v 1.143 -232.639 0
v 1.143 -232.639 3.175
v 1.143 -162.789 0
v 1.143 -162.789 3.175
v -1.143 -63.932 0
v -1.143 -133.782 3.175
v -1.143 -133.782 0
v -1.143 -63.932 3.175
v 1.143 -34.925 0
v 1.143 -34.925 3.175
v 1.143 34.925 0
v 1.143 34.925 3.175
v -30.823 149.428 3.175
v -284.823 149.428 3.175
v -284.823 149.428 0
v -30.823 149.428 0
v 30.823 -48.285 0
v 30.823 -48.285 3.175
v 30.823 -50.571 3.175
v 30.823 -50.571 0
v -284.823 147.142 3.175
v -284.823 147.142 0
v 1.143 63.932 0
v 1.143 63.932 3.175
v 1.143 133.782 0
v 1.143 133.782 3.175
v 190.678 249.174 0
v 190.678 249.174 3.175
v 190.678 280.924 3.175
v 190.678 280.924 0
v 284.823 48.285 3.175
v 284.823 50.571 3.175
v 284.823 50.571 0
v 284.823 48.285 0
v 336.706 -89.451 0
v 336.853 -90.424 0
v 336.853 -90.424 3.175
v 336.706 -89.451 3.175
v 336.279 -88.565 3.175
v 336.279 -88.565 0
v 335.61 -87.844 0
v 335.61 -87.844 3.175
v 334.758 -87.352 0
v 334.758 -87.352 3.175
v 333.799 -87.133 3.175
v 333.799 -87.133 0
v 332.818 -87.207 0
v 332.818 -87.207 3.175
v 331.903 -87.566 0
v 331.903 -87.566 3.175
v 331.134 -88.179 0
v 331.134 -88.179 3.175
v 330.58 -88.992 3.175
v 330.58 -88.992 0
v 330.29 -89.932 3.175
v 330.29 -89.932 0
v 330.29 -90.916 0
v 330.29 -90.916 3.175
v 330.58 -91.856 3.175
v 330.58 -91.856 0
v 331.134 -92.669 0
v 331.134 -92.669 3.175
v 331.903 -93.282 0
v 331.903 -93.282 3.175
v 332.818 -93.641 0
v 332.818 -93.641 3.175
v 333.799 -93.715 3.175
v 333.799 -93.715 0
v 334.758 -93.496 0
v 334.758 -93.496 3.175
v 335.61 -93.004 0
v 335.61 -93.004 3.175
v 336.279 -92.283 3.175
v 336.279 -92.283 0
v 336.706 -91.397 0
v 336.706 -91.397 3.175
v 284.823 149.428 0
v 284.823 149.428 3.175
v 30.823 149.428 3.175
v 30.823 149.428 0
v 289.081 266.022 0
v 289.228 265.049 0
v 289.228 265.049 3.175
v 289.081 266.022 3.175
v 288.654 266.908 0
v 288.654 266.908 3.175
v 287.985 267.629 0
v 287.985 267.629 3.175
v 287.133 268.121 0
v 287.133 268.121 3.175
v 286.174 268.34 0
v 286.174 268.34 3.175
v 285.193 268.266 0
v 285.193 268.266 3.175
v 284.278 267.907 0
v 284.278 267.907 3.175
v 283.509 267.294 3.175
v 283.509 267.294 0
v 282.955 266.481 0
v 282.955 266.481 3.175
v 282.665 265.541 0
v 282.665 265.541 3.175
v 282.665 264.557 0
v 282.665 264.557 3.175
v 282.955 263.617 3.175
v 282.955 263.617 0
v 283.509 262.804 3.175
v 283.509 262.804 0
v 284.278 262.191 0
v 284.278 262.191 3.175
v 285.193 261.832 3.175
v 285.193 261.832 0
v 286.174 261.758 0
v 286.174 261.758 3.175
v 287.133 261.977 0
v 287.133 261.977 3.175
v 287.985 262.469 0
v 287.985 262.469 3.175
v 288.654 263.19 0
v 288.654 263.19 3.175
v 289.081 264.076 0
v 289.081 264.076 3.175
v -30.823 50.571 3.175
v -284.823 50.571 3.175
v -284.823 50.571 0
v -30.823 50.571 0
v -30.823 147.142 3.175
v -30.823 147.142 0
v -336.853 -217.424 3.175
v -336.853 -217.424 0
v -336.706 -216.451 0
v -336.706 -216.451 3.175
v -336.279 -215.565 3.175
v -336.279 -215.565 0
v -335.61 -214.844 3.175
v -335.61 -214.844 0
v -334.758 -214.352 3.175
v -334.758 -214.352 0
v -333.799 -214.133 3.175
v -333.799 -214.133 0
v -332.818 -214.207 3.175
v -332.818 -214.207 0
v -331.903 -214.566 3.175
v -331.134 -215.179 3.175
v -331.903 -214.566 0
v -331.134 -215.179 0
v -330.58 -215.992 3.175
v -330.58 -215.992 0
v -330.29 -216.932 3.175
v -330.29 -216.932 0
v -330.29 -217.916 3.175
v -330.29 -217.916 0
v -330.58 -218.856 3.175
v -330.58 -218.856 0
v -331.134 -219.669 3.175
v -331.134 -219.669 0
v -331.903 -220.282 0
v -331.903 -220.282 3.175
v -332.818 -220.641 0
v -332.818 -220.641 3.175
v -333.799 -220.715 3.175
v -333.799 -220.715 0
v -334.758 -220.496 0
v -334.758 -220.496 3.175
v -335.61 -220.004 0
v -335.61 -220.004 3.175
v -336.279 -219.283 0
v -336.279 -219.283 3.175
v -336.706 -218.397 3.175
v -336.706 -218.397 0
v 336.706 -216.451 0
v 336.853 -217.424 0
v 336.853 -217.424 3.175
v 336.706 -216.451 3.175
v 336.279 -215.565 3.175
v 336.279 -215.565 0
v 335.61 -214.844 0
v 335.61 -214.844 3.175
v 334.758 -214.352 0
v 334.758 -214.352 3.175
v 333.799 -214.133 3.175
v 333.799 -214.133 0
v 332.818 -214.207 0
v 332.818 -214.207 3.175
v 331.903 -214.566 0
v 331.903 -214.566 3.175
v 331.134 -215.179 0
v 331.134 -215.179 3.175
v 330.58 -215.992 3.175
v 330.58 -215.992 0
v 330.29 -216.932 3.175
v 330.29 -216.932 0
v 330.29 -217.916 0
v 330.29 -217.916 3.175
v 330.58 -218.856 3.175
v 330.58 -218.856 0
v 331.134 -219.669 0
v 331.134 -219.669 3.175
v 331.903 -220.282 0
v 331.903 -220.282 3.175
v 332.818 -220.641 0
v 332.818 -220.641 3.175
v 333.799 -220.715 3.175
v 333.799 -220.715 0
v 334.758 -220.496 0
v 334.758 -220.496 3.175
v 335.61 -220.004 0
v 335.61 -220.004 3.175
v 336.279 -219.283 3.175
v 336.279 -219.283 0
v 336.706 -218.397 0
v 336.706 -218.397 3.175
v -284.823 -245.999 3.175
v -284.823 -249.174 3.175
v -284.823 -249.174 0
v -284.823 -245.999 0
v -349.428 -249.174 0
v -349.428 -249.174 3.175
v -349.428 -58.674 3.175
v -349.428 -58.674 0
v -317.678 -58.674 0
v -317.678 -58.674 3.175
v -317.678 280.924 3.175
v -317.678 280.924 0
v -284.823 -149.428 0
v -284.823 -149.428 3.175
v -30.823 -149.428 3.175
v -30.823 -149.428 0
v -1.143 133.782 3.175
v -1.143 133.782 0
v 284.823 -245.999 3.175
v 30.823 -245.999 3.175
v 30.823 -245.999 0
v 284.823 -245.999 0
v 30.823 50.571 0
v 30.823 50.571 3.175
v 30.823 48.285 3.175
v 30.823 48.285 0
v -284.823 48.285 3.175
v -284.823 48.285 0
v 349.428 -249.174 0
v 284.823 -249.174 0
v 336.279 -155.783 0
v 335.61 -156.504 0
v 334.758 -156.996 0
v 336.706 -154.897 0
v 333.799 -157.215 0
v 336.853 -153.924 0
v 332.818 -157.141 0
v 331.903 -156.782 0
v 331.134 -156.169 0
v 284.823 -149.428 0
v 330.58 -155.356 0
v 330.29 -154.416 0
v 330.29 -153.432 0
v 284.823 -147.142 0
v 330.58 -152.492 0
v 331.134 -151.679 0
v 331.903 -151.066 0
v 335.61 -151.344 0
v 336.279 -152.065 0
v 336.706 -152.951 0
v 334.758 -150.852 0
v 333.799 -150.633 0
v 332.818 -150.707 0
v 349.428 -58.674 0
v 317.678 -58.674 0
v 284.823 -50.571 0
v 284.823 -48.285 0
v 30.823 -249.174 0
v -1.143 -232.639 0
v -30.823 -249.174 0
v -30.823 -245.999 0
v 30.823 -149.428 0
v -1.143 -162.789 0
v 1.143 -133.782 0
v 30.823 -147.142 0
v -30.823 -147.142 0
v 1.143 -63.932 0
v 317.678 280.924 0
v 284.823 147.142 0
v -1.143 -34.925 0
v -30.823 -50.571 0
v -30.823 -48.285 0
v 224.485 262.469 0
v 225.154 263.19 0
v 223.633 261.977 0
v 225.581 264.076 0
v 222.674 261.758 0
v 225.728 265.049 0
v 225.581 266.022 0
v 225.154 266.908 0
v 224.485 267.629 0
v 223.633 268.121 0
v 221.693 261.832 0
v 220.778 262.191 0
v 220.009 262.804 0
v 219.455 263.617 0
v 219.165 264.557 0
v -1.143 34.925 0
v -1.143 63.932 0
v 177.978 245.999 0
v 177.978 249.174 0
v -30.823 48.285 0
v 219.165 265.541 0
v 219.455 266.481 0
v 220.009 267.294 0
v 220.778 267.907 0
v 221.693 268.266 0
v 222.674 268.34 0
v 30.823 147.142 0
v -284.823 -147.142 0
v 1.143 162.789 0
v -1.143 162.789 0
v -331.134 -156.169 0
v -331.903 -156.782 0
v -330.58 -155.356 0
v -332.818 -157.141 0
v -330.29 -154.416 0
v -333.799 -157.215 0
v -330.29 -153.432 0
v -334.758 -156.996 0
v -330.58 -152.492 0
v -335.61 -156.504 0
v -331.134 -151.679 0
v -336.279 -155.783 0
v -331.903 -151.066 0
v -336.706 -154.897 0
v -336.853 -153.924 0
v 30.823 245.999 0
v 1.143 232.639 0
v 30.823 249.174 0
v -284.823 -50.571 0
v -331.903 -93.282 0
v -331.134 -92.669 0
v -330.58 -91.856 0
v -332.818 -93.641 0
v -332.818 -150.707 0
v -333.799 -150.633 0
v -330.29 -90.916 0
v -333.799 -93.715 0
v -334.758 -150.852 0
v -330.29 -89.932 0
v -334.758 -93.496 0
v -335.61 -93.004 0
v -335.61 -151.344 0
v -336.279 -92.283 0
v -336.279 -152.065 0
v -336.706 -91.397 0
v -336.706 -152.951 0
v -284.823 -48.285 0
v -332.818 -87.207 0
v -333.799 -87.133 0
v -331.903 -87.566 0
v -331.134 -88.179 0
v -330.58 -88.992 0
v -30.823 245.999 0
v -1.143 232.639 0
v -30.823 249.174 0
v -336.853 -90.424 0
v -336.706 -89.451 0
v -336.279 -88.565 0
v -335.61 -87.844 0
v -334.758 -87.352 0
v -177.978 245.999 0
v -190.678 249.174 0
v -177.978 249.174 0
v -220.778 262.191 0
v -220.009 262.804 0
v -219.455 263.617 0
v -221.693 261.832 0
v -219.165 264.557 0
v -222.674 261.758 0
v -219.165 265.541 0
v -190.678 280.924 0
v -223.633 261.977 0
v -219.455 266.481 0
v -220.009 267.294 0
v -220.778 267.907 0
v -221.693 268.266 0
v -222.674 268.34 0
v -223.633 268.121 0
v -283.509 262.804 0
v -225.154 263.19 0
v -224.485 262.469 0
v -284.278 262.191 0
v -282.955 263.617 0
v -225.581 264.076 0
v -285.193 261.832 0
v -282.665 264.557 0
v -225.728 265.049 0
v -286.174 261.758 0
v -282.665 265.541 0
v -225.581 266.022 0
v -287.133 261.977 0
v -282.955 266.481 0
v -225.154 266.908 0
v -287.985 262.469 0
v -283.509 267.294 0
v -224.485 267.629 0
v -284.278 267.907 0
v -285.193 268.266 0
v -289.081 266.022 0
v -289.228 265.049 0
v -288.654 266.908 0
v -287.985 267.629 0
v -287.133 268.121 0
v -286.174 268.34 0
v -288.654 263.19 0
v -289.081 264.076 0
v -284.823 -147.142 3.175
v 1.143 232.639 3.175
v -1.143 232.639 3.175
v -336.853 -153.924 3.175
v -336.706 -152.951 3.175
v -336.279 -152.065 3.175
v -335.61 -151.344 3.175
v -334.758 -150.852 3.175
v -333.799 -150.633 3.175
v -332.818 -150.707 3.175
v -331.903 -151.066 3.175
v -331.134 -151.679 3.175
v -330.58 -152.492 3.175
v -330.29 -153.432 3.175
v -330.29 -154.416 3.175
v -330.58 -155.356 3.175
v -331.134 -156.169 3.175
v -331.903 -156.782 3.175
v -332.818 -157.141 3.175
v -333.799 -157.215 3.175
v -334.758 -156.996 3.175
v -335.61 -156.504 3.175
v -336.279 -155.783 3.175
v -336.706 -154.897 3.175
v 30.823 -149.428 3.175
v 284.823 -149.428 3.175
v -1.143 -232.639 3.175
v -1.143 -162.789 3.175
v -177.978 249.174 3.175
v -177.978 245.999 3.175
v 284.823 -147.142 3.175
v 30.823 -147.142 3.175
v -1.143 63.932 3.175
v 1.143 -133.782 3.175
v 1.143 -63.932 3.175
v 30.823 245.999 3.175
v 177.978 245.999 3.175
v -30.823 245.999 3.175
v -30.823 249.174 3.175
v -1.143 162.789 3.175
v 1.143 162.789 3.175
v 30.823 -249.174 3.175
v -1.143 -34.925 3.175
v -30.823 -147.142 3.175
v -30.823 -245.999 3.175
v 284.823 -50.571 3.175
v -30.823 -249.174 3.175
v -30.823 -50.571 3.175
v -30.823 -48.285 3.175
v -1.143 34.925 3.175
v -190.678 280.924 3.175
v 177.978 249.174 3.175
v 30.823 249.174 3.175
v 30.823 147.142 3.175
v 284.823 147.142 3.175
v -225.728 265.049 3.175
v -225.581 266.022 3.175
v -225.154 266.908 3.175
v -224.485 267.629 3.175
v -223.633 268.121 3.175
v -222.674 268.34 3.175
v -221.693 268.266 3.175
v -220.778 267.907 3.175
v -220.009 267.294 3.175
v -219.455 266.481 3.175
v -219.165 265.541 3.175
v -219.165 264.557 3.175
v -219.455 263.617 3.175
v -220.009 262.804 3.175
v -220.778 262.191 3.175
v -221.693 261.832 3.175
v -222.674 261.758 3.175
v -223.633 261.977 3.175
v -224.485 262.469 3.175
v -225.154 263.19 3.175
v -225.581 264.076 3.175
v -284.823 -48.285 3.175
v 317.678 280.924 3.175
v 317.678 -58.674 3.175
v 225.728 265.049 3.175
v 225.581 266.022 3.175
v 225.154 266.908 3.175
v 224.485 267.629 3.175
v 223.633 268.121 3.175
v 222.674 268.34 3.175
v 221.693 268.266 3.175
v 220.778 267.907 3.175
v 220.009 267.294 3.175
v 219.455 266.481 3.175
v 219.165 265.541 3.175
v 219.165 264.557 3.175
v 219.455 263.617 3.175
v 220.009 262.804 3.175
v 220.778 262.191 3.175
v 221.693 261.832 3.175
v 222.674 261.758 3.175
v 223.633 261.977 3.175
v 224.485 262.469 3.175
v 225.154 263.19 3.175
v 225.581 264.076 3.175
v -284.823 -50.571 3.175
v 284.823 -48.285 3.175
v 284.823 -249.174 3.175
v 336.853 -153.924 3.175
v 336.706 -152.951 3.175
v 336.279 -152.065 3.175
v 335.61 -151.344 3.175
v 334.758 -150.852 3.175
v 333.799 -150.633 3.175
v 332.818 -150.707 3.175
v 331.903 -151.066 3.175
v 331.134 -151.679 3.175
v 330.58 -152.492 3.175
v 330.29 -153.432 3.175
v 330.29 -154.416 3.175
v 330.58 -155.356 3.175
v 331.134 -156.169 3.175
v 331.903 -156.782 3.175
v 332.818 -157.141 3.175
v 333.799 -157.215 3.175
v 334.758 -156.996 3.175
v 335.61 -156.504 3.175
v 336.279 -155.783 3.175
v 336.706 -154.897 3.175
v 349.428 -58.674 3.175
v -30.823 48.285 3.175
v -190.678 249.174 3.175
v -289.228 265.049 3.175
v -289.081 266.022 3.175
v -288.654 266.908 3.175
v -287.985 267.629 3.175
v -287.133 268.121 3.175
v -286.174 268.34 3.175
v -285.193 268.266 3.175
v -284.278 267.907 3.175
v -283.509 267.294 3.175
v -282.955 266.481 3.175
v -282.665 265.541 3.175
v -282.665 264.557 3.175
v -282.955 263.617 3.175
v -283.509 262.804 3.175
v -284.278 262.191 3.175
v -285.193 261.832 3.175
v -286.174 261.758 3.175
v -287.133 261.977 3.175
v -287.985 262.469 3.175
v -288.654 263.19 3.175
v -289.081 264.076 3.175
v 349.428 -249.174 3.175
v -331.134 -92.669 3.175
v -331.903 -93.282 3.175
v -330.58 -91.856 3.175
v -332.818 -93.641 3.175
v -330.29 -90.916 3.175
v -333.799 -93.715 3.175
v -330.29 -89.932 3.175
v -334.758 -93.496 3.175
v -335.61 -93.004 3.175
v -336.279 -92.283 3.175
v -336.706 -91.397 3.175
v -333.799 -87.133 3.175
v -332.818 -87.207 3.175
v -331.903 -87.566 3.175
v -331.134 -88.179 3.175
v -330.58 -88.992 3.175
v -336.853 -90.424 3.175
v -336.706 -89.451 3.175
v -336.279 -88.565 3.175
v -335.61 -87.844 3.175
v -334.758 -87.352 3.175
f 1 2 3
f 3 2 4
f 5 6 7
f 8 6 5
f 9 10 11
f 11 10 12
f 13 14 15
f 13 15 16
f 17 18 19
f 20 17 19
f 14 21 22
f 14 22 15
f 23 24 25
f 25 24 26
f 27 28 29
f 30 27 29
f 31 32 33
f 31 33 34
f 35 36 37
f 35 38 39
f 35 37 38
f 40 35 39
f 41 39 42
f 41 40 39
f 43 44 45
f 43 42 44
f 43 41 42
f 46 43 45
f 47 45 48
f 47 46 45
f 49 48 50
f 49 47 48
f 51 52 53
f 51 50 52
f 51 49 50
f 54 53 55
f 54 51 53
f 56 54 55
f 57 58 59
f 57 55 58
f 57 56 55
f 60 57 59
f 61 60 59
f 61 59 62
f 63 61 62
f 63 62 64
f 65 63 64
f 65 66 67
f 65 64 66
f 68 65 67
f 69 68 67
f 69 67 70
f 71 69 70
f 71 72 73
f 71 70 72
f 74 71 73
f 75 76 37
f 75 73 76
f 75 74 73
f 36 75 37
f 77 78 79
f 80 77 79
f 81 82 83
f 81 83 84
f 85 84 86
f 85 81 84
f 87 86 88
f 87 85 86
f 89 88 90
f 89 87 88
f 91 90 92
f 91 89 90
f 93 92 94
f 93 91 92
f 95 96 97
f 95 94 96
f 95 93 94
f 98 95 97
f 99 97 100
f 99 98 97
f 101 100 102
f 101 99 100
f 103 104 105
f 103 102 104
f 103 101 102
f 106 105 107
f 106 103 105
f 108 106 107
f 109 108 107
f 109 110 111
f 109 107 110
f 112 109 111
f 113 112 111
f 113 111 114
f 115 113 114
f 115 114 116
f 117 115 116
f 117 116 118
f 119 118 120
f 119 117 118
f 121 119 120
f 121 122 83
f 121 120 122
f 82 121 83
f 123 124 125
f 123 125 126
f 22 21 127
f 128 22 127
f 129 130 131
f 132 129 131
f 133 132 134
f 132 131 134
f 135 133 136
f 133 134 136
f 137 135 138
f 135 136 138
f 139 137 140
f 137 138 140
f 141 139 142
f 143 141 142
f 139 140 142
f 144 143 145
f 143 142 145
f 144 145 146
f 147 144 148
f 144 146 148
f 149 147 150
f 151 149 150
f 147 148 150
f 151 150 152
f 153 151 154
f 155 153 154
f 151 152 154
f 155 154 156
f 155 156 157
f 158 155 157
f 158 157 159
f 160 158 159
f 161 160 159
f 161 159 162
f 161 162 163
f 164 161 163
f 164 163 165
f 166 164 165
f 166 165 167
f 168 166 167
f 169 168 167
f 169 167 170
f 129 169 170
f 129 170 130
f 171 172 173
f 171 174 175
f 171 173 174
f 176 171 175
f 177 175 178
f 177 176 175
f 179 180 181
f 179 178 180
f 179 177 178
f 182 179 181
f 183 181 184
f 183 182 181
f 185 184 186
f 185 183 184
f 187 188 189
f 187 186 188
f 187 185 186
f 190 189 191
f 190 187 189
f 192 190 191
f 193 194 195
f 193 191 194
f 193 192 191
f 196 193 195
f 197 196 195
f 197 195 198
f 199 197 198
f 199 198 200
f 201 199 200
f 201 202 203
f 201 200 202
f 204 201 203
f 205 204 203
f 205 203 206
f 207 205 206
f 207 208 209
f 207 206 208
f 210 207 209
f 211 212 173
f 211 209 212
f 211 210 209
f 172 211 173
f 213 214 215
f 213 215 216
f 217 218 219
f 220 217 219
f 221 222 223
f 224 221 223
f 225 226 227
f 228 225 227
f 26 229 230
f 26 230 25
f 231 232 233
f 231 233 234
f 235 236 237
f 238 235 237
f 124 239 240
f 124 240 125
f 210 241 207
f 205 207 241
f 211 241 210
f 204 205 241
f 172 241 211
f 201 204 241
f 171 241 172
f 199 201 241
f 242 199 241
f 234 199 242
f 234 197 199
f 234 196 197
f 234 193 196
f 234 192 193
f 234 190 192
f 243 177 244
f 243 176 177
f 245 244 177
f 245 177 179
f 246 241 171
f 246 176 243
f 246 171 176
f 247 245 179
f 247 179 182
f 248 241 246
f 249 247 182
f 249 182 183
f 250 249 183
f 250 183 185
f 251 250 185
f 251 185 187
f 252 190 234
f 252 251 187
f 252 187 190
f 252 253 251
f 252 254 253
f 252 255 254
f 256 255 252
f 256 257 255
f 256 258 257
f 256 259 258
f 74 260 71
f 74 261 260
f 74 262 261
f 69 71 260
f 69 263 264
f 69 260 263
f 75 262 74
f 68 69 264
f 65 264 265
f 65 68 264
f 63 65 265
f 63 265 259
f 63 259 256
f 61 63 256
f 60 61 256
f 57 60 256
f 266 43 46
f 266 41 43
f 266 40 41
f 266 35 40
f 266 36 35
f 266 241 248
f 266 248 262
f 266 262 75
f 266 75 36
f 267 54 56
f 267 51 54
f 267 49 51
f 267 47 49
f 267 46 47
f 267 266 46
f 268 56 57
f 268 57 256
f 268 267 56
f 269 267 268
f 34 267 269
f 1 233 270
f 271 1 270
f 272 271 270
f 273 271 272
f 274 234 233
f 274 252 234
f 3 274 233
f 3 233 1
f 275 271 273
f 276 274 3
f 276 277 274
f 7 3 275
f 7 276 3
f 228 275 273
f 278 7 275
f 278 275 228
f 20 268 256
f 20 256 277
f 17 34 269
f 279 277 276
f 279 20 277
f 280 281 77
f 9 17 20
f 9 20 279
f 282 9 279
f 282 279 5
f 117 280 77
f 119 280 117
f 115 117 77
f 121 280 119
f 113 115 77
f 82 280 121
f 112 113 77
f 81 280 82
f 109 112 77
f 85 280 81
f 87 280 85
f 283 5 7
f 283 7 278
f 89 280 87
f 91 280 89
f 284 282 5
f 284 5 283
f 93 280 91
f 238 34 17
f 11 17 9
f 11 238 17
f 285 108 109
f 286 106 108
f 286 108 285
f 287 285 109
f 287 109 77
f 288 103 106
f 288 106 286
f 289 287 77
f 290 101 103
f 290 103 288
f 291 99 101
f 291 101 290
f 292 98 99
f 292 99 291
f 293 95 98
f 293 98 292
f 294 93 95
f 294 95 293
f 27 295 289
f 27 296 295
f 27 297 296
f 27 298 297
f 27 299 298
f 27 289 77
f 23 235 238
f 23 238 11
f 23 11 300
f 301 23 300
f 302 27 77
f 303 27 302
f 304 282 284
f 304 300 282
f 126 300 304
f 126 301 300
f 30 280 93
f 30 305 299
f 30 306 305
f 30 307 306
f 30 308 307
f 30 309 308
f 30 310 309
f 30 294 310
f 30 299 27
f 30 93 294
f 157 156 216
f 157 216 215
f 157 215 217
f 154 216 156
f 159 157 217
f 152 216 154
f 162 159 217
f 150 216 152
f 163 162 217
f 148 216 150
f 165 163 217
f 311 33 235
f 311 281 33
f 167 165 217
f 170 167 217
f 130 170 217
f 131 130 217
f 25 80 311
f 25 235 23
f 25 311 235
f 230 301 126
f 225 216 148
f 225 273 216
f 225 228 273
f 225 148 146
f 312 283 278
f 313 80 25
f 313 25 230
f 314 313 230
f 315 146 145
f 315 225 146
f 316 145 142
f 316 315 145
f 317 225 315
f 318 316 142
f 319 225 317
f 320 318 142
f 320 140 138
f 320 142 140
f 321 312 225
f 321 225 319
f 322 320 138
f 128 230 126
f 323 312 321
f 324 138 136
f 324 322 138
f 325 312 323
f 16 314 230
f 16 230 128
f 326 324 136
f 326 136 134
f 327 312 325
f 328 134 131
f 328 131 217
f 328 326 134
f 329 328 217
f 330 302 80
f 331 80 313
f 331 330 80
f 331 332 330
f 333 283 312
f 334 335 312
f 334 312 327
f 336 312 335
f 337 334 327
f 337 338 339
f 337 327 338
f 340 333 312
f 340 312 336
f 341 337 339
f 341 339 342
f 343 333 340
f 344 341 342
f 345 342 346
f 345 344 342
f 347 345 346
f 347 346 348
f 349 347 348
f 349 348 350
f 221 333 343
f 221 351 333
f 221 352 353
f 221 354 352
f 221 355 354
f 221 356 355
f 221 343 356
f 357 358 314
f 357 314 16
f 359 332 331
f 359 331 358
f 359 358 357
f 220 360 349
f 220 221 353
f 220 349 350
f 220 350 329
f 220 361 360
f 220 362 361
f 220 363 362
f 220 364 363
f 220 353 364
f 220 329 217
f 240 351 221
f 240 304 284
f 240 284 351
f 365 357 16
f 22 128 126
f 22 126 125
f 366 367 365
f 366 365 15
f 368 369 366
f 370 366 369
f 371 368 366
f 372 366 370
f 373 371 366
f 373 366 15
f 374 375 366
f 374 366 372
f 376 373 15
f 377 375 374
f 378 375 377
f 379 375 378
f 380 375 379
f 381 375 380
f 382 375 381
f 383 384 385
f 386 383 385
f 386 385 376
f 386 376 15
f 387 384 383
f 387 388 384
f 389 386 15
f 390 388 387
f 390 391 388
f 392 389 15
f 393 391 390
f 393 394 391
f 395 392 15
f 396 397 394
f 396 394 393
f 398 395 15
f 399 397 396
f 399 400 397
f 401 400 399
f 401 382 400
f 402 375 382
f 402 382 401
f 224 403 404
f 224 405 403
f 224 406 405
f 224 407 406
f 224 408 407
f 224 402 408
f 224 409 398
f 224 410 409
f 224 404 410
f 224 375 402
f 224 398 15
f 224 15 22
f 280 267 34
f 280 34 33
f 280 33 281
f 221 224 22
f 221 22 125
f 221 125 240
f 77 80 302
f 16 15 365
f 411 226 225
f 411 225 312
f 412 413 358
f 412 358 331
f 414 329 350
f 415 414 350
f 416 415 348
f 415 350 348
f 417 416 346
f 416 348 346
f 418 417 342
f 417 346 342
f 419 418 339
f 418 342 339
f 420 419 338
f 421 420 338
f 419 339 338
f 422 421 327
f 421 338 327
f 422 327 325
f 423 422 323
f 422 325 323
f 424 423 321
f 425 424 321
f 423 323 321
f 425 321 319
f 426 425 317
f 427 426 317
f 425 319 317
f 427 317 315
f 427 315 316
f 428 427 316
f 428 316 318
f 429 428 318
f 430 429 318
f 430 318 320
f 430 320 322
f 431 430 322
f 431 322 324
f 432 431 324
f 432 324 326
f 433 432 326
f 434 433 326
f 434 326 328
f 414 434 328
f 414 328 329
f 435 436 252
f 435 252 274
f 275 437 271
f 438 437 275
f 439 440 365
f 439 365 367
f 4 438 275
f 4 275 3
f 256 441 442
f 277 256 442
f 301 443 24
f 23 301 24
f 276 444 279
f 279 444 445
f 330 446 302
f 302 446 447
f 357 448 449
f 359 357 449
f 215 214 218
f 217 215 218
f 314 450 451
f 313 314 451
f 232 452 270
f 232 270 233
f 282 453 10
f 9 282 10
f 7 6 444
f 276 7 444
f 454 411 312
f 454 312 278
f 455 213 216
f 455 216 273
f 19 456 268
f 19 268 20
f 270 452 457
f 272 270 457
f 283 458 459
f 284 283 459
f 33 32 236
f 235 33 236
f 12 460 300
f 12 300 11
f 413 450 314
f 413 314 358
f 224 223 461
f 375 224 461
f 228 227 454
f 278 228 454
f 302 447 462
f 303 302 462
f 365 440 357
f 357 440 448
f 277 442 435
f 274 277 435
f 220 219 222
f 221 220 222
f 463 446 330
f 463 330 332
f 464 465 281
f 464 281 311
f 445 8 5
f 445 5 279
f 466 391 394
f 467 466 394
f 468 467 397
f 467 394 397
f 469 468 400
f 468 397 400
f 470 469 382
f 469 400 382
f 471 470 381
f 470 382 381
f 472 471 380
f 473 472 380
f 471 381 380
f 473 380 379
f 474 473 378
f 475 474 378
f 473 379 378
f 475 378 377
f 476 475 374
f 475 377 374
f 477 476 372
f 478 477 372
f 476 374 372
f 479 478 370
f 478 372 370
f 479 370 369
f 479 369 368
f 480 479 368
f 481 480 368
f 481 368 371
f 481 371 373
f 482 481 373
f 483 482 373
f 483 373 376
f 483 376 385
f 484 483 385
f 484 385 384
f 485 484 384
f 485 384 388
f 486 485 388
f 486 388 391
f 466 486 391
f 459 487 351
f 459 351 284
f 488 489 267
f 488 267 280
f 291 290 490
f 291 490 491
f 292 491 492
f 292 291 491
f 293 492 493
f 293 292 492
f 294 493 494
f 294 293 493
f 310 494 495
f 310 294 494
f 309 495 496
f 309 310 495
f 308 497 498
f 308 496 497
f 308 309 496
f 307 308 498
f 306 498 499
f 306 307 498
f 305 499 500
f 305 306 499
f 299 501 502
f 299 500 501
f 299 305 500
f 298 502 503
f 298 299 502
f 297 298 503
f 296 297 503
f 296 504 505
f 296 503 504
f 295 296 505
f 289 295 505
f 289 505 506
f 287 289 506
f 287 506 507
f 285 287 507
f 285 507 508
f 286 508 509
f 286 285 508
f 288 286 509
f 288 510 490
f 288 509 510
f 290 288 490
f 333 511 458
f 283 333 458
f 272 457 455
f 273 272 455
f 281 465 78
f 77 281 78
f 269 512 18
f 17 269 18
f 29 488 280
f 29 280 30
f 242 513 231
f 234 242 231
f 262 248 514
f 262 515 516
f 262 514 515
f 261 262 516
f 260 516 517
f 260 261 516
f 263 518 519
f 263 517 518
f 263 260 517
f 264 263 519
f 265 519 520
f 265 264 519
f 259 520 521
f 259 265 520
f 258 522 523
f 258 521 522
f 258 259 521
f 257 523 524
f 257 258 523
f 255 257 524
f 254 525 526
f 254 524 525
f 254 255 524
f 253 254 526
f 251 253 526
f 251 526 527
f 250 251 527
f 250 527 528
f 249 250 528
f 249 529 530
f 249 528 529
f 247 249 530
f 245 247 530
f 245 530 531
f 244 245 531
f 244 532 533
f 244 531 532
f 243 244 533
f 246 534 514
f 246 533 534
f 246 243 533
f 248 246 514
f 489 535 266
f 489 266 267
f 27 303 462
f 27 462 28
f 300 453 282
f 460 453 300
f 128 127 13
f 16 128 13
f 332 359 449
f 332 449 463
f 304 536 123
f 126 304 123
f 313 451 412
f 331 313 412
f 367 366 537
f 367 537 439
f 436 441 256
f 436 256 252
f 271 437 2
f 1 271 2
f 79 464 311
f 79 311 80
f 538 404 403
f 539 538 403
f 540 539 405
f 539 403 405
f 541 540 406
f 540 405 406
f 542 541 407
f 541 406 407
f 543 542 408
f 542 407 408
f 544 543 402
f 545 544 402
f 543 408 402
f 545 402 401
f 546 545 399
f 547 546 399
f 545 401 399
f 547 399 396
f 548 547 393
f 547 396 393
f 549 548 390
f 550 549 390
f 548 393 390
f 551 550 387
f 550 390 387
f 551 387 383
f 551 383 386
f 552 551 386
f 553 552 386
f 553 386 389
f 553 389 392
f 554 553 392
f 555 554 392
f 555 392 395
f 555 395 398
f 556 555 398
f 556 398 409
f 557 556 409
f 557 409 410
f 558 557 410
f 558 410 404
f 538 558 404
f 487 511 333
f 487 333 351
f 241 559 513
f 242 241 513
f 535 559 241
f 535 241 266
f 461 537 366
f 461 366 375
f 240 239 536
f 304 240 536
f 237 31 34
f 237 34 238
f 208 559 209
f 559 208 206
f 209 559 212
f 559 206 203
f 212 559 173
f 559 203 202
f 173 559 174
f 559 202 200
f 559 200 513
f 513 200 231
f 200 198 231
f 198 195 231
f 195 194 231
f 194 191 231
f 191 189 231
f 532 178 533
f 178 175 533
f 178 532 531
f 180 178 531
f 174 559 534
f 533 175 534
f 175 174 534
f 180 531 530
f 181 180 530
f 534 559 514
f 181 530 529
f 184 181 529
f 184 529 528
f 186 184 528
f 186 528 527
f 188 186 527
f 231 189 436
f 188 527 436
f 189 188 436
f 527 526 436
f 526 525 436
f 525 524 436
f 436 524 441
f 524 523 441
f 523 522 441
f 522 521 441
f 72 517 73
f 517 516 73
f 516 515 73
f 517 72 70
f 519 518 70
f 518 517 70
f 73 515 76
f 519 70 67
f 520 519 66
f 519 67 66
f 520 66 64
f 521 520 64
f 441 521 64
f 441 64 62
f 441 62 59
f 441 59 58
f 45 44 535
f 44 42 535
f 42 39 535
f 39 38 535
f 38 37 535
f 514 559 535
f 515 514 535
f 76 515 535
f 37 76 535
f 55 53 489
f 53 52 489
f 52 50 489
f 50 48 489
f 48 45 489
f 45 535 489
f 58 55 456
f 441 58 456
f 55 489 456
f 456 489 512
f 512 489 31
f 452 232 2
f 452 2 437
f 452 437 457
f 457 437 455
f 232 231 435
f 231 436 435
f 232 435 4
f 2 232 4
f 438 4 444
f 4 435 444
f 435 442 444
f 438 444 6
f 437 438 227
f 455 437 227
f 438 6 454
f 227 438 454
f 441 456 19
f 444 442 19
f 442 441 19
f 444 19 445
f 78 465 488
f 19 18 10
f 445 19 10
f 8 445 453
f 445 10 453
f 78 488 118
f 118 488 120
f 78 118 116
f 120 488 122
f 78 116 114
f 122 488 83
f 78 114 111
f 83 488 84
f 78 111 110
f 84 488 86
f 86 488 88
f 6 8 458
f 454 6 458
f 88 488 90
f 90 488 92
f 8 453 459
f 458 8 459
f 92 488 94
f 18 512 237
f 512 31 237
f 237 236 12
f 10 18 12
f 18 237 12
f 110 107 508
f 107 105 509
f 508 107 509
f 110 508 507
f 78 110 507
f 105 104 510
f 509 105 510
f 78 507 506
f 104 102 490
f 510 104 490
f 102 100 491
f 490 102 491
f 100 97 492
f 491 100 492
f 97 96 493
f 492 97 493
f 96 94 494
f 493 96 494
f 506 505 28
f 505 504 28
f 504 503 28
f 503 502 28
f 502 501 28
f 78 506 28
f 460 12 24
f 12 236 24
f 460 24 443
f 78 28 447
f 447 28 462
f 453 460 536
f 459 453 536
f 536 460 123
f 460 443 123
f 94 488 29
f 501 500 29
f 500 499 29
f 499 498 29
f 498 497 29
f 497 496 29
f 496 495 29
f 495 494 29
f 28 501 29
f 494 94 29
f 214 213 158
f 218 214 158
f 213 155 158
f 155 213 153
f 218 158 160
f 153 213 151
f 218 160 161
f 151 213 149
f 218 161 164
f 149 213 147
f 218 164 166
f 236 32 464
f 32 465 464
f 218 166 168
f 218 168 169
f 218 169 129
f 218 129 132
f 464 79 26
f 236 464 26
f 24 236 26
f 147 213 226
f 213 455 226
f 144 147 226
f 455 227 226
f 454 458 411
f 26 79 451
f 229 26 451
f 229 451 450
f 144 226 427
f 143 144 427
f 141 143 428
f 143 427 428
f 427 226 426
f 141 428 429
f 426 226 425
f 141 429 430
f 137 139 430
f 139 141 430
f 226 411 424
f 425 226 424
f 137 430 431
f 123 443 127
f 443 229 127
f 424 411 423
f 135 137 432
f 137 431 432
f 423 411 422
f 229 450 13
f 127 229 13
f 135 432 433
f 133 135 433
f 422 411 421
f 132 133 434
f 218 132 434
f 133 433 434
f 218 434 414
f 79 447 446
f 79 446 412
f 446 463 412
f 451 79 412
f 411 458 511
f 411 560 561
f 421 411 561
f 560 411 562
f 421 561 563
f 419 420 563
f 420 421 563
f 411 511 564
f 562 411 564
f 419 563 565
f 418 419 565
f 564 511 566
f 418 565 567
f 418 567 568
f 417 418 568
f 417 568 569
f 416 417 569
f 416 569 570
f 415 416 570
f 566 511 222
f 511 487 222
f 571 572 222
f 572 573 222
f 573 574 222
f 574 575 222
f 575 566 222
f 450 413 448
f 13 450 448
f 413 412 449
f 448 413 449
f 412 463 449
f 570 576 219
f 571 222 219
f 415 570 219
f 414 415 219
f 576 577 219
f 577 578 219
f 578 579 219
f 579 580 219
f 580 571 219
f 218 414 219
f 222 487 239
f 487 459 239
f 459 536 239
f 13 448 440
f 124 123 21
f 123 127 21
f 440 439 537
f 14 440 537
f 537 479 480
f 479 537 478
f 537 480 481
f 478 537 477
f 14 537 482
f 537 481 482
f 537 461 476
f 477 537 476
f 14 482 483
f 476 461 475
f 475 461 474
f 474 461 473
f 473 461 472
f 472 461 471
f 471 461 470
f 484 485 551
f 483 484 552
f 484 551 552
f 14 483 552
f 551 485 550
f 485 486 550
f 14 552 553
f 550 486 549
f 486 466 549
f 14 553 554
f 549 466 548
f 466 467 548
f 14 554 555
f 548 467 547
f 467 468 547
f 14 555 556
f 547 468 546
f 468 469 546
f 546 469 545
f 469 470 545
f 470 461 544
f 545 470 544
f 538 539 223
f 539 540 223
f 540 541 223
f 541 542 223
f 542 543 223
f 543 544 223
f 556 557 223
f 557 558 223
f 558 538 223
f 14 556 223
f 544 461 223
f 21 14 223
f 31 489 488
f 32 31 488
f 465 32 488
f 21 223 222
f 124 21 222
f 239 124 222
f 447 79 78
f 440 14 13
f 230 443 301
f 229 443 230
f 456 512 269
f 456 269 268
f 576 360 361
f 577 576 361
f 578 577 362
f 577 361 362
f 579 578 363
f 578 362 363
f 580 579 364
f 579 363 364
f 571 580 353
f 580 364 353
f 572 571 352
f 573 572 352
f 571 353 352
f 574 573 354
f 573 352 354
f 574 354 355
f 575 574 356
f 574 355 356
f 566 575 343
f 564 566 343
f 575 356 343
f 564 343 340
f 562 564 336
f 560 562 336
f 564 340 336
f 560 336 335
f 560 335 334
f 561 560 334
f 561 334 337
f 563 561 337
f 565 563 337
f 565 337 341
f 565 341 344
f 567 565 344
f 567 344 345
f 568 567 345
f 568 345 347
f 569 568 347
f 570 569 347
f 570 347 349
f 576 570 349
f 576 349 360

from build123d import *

# Parameters (mm, degrees)
MASTER_SKETCH_W         = 635.3556
MASTER_SKETCH_H         = 498.348
BOSS_EXTRUDE1_DEPTH     = 3.175
SKETCH2_W               = 31.75
SKETCH2_H               = 190.5
BOSS_EXTRUDE2_DEPTH     = 3.175
M6_CLEARANCE_HOLE1_D    = 6.6
SKETCH5_W               = 2.286
SKETCH5_H               = 69.85
CUT_EXTRUDE1_DEPTH      = 430.182420788
LPATTERN1_COUNT         = 5
LPATTERN1_PITCH         = 98.8568
SKETCH7_W               = 254
SKETCH7_H               = 2.286
CUT_EXTRUDE3_DEPTH      = 430.182420788
LPATTERN2_COUNT         = 4
LPATTERN2_PITCH         = 98.8568
MIRROR4_COPY_1_SKETCH_W = 254
MIRROR4_COPY_1_SKETCH_H = 2.286
MIRROR4_COPY_1_DEPTH    = 430.182420788
MIRROR4_COPY_2_SKETCH_W = 254
MIRROR4_COPY_2_SKETCH_H = 2.286
MIRROR4_COPY_2_DEPTH    = 430.182420788
MIRROR4_COPY_3_SKETCH_W = 254
MIRROR4_COPY_3_SKETCH_H = 2.286
MIRROR4_COPY_3_DEPTH    = 430.182420788
SKETCH10_W              = 127
SKETCH10_H              = 31.75
BOSS_EXTRUDE3_DEPTH     = 3.175
M6_CLEARANCE_HOLE2_D    = 6.6
SKETCH6_W               = 254
SKETCH6_H               = 3.175
SKETCH6_W_2             = 147.1549
CUT_EXTRUDE2_DEPTH      = 449.361641774


with BuildPart() as part:
    # Master Sketch → Boss-Extrude1 (new body)
    with BuildSketch(Plane.XY):
        Rectangle(MASTER_SKETCH_W, MASTER_SKETCH_H)
    extrude(amount=BOSS_EXTRUDE1_DEPTH)

    # Sketch2 → Boss-Extrude2 (add)
    with BuildSketch(Plane.XY.offset(3.175)):
        with Locations((-333.5528, -153.924)):
            Rectangle(SKETCH2_W, SKETCH2_H)
    boss_extrude2 = extrude(amount=-BOSS_EXTRUDE2_DEPTH)

    # M6 Clearance Hole1 (through all)
    with Locations(Plane.XY.offset(3.175)):
        with Locations((-333.5528, -90.424), (-333.5528, -153.924), (-333.5528, -217.424)):
            m6_clearance_hole1 = Hole(M6_CLEARANCE_HOLE1_D / 2)

    # Mirror1: Boss-Extrude2, M6 Clearance Hole1 across plane
    add(boss_extrude2.mirror(Plane(origin=(0, 0, 0), x_dir=(0, 0, 1), z_dir=(1, 0, 0))))
    add(m6_clearance_hole1.mirror(Plane(origin=(0, 0, 0), x_dir=(0, 0, 1), z_dir=(1, 0, 0))), mode=Mode.SUBTRACT)

    # Sketch5 → Cut-Extrude1 (cut, through all)
    with BuildSketch(Plane.XY.offset(3.175)):
        with Locations((0, 197.7136)):
            Rectangle(SKETCH5_W, SKETCH5_H)
    cut_extrude1 = extrude(amount=-CUT_EXTRUDE1_DEPTH, mode=Mode.SUBTRACT)

    # LPattern1: Cut-Extrude1 ×5
    with Locations(*[(0, -i * LPATTERN1_PITCH, 0) for i in range(1, LPATTERN1_COUNT)]):
        add(cut_extrude1, mode=Mode.SUBTRACT)

    # Sketch7 → Cut-Extrude3 (cut, through all)
    with BuildSketch(Plane.XY.offset(3.175)):
        with Locations((-157.8229, 148.2852)):
            Rectangle(SKETCH7_W, SKETCH7_H)
    cut_extrude3 = extrude(amount=-CUT_EXTRUDE3_DEPTH, mode=Mode.SUBTRACT)

    # LPattern2: Cut-Extrude3 ×4
    with Locations(*[(0, -i * LPATTERN2_PITCH, 0) for i in range(1, LPATTERN2_COUNT)]):
        add(cut_extrude3, mode=Mode.SUBTRACT)

    # Mirror4: Cut-Extrude3 across plane
    add(cut_extrude3.mirror(Plane(origin=(0, 0, 0), x_dir=(0, 0, 1), z_dir=(1, 0, 0))), mode=Mode.SUBTRACT)

    # Mirror4 copy 1 sketch → Mirror4 copy 1 (cut, through all)
    with BuildSketch(Plane(origin=(0, -98.8568, 3.175), x_dir=(-1, 0, 0), z_dir=(0, 0, 1))):
        with Locations((-157.8229, -148.2852)):
            Rectangle(MIRROR4_COPY_1_SKETCH_W, MIRROR4_COPY_1_SKETCH_H)
    extrude(amount=-MIRROR4_COPY_1_DEPTH, mode=Mode.SUBTRACT)

    # Mirror4 copy 2 sketch → Mirror4 copy 2 (cut, through all)
    with BuildSketch(Plane(origin=(0, -197.7136, 3.175), x_dir=(-1, 0, 0), z_dir=(0, 0, 1))):
        with Locations((-157.8229, -148.2852)):
            Rectangle(MIRROR4_COPY_2_SKETCH_W, MIRROR4_COPY_2_SKETCH_H)
    extrude(amount=-MIRROR4_COPY_2_DEPTH, mode=Mode.SUBTRACT)

    # Mirror4 copy 3 sketch → Mirror4 copy 3 (cut, through all)
    with BuildSketch(Plane(origin=(0, -296.5704, 3.175), x_dir=(-1, 0, 0), z_dir=(0, 0, 1))):
        with Locations((-157.8229, -148.2852)):
            Rectangle(MIRROR4_COPY_3_SKETCH_W, MIRROR4_COPY_3_SKETCH_H)
    extrude(amount=-MIRROR4_COPY_3_DEPTH, mode=Mode.SUBTRACT)

    # Sketch10 → Boss-Extrude3 (add)
    with BuildSketch(Plane.XY.offset(3.175)):
        with Locations((-254.1778, 265.049)):
            Rectangle(SKETCH10_W, SKETCH10_H)
    boss_extrude3 = extrude(amount=-BOSS_EXTRUDE3_DEPTH)

    # M6 Clearance Hole2 (through all)
    with Locations(Plane.XY.offset(3.175)):
        with Locations((-285.9278, 265.049), (-222.4278, 265.049)):
            m6_clearance_hole2 = Hole(M6_CLEARANCE_HOLE2_D / 2)

    # Mirror6: Boss-Extrude3, M6 Clearance Hole2 across plane
    add(boss_extrude3.mirror(Plane(origin=(0, 0, 0), x_dir=(0, 0, 1), z_dir=(1, 0, 0))))
    add(m6_clearance_hole2.mirror(Plane(origin=(0, 0, 0), x_dir=(0, 0, 1), z_dir=(1, 0, 0))), mode=Mode.SUBTRACT)

    # Sketch6 → Cut-Extrude2 (cut, through all)
    with BuildSketch(Plane.XY.offset(3.175)):
        with Locations((-157.8229, -247.5865)):
            Rectangle(SKETCH6_W, SKETCH6_H)
        with Locations((157.8229, -247.5865)):
            Rectangle(SKETCH6_W, SKETCH6_H)
        with Locations((-104.40035, 247.5865)):
            Rectangle(SKETCH6_W_2, SKETCH6_H)
        with Locations((104.40035, 247.5865)):
            Rectangle(SKETCH6_W_2, SKETCH6_H)
    extrude(amount=-CUT_EXTRUDE2_DEPTH, mode=Mode.SUBTRACT)


solid = part.part
